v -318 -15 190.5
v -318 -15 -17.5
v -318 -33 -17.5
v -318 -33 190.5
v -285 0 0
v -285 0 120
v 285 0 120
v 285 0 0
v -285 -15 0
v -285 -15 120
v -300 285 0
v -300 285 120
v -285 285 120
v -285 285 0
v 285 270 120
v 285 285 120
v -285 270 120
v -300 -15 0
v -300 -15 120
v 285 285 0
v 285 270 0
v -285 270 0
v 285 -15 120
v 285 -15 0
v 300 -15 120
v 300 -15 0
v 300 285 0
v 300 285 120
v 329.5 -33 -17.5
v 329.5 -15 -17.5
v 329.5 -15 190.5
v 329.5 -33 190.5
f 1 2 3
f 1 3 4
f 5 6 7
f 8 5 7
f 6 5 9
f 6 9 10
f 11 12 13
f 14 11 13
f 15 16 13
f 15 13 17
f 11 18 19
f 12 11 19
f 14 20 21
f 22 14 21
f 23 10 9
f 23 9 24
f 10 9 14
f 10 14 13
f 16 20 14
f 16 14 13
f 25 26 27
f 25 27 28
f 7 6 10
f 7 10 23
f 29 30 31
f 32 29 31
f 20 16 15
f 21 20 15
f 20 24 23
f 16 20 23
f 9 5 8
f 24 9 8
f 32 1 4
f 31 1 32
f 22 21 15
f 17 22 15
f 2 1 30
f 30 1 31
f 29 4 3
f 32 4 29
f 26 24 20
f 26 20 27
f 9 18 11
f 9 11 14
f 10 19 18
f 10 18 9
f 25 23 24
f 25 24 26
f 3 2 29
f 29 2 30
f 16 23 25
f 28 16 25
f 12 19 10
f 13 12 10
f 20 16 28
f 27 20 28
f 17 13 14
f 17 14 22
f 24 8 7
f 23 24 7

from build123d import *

# Parameters (mm, degrees)
F0_W     = 570
F0_H     = 120
F1_DEPTH = 15
F2_W     = 15
F2_H     = 120
F3_DEPTH = 300
F4_W     = 15
F4_H     = 120
F5_DEPTH = 570
F6_W     = 647.5
F6_H     = 208
F7_DEPTH = 18


with BuildPart() as f1:
    # F0 (on Front) → F1 (new body)
    with BuildSketch(Plane.XZ):
        with Locations((0, 60)):
            Rectangle(F0_W, F0_H)
    extrude(amount=F1_DEPTH)


with BuildPart() as f3:
    # F2 (on face) → F3 (new body)
    with BuildSketch(Plane.XZ.offset(15)):
        with Locations((292.5, 60)):
            Rectangle(F2_W, F2_H)
        with Locations((-292.5, 60)):
            Rectangle(F2_W, F2_H)
    extrude(amount=-F3_DEPTH)


with BuildPart() as f5:
    # F4 (on face) → F5 (new body, through all)
    with BuildSketch(Plane(origin=(285, 0, 0), x_dir=(0, -1, 0), z_dir=(-1, 0, 0))):
        with Locations((-277.5, 60)):
            Rectangle(F4_W, F4_H)
    extrude(amount=F5_DEPTH)


with BuildPart() as f7:
    # F6 (on face) → F7 (new body)
    with BuildSketch(Plane.XZ.offset(15)):
        with Locations((5.75, 86.5)):
            Rectangle(F6_W, F6_H)
    extrude(amount=F7_DEPTH)


solid = Compound([f1.part, f3.part, f5.part, f7.part])
